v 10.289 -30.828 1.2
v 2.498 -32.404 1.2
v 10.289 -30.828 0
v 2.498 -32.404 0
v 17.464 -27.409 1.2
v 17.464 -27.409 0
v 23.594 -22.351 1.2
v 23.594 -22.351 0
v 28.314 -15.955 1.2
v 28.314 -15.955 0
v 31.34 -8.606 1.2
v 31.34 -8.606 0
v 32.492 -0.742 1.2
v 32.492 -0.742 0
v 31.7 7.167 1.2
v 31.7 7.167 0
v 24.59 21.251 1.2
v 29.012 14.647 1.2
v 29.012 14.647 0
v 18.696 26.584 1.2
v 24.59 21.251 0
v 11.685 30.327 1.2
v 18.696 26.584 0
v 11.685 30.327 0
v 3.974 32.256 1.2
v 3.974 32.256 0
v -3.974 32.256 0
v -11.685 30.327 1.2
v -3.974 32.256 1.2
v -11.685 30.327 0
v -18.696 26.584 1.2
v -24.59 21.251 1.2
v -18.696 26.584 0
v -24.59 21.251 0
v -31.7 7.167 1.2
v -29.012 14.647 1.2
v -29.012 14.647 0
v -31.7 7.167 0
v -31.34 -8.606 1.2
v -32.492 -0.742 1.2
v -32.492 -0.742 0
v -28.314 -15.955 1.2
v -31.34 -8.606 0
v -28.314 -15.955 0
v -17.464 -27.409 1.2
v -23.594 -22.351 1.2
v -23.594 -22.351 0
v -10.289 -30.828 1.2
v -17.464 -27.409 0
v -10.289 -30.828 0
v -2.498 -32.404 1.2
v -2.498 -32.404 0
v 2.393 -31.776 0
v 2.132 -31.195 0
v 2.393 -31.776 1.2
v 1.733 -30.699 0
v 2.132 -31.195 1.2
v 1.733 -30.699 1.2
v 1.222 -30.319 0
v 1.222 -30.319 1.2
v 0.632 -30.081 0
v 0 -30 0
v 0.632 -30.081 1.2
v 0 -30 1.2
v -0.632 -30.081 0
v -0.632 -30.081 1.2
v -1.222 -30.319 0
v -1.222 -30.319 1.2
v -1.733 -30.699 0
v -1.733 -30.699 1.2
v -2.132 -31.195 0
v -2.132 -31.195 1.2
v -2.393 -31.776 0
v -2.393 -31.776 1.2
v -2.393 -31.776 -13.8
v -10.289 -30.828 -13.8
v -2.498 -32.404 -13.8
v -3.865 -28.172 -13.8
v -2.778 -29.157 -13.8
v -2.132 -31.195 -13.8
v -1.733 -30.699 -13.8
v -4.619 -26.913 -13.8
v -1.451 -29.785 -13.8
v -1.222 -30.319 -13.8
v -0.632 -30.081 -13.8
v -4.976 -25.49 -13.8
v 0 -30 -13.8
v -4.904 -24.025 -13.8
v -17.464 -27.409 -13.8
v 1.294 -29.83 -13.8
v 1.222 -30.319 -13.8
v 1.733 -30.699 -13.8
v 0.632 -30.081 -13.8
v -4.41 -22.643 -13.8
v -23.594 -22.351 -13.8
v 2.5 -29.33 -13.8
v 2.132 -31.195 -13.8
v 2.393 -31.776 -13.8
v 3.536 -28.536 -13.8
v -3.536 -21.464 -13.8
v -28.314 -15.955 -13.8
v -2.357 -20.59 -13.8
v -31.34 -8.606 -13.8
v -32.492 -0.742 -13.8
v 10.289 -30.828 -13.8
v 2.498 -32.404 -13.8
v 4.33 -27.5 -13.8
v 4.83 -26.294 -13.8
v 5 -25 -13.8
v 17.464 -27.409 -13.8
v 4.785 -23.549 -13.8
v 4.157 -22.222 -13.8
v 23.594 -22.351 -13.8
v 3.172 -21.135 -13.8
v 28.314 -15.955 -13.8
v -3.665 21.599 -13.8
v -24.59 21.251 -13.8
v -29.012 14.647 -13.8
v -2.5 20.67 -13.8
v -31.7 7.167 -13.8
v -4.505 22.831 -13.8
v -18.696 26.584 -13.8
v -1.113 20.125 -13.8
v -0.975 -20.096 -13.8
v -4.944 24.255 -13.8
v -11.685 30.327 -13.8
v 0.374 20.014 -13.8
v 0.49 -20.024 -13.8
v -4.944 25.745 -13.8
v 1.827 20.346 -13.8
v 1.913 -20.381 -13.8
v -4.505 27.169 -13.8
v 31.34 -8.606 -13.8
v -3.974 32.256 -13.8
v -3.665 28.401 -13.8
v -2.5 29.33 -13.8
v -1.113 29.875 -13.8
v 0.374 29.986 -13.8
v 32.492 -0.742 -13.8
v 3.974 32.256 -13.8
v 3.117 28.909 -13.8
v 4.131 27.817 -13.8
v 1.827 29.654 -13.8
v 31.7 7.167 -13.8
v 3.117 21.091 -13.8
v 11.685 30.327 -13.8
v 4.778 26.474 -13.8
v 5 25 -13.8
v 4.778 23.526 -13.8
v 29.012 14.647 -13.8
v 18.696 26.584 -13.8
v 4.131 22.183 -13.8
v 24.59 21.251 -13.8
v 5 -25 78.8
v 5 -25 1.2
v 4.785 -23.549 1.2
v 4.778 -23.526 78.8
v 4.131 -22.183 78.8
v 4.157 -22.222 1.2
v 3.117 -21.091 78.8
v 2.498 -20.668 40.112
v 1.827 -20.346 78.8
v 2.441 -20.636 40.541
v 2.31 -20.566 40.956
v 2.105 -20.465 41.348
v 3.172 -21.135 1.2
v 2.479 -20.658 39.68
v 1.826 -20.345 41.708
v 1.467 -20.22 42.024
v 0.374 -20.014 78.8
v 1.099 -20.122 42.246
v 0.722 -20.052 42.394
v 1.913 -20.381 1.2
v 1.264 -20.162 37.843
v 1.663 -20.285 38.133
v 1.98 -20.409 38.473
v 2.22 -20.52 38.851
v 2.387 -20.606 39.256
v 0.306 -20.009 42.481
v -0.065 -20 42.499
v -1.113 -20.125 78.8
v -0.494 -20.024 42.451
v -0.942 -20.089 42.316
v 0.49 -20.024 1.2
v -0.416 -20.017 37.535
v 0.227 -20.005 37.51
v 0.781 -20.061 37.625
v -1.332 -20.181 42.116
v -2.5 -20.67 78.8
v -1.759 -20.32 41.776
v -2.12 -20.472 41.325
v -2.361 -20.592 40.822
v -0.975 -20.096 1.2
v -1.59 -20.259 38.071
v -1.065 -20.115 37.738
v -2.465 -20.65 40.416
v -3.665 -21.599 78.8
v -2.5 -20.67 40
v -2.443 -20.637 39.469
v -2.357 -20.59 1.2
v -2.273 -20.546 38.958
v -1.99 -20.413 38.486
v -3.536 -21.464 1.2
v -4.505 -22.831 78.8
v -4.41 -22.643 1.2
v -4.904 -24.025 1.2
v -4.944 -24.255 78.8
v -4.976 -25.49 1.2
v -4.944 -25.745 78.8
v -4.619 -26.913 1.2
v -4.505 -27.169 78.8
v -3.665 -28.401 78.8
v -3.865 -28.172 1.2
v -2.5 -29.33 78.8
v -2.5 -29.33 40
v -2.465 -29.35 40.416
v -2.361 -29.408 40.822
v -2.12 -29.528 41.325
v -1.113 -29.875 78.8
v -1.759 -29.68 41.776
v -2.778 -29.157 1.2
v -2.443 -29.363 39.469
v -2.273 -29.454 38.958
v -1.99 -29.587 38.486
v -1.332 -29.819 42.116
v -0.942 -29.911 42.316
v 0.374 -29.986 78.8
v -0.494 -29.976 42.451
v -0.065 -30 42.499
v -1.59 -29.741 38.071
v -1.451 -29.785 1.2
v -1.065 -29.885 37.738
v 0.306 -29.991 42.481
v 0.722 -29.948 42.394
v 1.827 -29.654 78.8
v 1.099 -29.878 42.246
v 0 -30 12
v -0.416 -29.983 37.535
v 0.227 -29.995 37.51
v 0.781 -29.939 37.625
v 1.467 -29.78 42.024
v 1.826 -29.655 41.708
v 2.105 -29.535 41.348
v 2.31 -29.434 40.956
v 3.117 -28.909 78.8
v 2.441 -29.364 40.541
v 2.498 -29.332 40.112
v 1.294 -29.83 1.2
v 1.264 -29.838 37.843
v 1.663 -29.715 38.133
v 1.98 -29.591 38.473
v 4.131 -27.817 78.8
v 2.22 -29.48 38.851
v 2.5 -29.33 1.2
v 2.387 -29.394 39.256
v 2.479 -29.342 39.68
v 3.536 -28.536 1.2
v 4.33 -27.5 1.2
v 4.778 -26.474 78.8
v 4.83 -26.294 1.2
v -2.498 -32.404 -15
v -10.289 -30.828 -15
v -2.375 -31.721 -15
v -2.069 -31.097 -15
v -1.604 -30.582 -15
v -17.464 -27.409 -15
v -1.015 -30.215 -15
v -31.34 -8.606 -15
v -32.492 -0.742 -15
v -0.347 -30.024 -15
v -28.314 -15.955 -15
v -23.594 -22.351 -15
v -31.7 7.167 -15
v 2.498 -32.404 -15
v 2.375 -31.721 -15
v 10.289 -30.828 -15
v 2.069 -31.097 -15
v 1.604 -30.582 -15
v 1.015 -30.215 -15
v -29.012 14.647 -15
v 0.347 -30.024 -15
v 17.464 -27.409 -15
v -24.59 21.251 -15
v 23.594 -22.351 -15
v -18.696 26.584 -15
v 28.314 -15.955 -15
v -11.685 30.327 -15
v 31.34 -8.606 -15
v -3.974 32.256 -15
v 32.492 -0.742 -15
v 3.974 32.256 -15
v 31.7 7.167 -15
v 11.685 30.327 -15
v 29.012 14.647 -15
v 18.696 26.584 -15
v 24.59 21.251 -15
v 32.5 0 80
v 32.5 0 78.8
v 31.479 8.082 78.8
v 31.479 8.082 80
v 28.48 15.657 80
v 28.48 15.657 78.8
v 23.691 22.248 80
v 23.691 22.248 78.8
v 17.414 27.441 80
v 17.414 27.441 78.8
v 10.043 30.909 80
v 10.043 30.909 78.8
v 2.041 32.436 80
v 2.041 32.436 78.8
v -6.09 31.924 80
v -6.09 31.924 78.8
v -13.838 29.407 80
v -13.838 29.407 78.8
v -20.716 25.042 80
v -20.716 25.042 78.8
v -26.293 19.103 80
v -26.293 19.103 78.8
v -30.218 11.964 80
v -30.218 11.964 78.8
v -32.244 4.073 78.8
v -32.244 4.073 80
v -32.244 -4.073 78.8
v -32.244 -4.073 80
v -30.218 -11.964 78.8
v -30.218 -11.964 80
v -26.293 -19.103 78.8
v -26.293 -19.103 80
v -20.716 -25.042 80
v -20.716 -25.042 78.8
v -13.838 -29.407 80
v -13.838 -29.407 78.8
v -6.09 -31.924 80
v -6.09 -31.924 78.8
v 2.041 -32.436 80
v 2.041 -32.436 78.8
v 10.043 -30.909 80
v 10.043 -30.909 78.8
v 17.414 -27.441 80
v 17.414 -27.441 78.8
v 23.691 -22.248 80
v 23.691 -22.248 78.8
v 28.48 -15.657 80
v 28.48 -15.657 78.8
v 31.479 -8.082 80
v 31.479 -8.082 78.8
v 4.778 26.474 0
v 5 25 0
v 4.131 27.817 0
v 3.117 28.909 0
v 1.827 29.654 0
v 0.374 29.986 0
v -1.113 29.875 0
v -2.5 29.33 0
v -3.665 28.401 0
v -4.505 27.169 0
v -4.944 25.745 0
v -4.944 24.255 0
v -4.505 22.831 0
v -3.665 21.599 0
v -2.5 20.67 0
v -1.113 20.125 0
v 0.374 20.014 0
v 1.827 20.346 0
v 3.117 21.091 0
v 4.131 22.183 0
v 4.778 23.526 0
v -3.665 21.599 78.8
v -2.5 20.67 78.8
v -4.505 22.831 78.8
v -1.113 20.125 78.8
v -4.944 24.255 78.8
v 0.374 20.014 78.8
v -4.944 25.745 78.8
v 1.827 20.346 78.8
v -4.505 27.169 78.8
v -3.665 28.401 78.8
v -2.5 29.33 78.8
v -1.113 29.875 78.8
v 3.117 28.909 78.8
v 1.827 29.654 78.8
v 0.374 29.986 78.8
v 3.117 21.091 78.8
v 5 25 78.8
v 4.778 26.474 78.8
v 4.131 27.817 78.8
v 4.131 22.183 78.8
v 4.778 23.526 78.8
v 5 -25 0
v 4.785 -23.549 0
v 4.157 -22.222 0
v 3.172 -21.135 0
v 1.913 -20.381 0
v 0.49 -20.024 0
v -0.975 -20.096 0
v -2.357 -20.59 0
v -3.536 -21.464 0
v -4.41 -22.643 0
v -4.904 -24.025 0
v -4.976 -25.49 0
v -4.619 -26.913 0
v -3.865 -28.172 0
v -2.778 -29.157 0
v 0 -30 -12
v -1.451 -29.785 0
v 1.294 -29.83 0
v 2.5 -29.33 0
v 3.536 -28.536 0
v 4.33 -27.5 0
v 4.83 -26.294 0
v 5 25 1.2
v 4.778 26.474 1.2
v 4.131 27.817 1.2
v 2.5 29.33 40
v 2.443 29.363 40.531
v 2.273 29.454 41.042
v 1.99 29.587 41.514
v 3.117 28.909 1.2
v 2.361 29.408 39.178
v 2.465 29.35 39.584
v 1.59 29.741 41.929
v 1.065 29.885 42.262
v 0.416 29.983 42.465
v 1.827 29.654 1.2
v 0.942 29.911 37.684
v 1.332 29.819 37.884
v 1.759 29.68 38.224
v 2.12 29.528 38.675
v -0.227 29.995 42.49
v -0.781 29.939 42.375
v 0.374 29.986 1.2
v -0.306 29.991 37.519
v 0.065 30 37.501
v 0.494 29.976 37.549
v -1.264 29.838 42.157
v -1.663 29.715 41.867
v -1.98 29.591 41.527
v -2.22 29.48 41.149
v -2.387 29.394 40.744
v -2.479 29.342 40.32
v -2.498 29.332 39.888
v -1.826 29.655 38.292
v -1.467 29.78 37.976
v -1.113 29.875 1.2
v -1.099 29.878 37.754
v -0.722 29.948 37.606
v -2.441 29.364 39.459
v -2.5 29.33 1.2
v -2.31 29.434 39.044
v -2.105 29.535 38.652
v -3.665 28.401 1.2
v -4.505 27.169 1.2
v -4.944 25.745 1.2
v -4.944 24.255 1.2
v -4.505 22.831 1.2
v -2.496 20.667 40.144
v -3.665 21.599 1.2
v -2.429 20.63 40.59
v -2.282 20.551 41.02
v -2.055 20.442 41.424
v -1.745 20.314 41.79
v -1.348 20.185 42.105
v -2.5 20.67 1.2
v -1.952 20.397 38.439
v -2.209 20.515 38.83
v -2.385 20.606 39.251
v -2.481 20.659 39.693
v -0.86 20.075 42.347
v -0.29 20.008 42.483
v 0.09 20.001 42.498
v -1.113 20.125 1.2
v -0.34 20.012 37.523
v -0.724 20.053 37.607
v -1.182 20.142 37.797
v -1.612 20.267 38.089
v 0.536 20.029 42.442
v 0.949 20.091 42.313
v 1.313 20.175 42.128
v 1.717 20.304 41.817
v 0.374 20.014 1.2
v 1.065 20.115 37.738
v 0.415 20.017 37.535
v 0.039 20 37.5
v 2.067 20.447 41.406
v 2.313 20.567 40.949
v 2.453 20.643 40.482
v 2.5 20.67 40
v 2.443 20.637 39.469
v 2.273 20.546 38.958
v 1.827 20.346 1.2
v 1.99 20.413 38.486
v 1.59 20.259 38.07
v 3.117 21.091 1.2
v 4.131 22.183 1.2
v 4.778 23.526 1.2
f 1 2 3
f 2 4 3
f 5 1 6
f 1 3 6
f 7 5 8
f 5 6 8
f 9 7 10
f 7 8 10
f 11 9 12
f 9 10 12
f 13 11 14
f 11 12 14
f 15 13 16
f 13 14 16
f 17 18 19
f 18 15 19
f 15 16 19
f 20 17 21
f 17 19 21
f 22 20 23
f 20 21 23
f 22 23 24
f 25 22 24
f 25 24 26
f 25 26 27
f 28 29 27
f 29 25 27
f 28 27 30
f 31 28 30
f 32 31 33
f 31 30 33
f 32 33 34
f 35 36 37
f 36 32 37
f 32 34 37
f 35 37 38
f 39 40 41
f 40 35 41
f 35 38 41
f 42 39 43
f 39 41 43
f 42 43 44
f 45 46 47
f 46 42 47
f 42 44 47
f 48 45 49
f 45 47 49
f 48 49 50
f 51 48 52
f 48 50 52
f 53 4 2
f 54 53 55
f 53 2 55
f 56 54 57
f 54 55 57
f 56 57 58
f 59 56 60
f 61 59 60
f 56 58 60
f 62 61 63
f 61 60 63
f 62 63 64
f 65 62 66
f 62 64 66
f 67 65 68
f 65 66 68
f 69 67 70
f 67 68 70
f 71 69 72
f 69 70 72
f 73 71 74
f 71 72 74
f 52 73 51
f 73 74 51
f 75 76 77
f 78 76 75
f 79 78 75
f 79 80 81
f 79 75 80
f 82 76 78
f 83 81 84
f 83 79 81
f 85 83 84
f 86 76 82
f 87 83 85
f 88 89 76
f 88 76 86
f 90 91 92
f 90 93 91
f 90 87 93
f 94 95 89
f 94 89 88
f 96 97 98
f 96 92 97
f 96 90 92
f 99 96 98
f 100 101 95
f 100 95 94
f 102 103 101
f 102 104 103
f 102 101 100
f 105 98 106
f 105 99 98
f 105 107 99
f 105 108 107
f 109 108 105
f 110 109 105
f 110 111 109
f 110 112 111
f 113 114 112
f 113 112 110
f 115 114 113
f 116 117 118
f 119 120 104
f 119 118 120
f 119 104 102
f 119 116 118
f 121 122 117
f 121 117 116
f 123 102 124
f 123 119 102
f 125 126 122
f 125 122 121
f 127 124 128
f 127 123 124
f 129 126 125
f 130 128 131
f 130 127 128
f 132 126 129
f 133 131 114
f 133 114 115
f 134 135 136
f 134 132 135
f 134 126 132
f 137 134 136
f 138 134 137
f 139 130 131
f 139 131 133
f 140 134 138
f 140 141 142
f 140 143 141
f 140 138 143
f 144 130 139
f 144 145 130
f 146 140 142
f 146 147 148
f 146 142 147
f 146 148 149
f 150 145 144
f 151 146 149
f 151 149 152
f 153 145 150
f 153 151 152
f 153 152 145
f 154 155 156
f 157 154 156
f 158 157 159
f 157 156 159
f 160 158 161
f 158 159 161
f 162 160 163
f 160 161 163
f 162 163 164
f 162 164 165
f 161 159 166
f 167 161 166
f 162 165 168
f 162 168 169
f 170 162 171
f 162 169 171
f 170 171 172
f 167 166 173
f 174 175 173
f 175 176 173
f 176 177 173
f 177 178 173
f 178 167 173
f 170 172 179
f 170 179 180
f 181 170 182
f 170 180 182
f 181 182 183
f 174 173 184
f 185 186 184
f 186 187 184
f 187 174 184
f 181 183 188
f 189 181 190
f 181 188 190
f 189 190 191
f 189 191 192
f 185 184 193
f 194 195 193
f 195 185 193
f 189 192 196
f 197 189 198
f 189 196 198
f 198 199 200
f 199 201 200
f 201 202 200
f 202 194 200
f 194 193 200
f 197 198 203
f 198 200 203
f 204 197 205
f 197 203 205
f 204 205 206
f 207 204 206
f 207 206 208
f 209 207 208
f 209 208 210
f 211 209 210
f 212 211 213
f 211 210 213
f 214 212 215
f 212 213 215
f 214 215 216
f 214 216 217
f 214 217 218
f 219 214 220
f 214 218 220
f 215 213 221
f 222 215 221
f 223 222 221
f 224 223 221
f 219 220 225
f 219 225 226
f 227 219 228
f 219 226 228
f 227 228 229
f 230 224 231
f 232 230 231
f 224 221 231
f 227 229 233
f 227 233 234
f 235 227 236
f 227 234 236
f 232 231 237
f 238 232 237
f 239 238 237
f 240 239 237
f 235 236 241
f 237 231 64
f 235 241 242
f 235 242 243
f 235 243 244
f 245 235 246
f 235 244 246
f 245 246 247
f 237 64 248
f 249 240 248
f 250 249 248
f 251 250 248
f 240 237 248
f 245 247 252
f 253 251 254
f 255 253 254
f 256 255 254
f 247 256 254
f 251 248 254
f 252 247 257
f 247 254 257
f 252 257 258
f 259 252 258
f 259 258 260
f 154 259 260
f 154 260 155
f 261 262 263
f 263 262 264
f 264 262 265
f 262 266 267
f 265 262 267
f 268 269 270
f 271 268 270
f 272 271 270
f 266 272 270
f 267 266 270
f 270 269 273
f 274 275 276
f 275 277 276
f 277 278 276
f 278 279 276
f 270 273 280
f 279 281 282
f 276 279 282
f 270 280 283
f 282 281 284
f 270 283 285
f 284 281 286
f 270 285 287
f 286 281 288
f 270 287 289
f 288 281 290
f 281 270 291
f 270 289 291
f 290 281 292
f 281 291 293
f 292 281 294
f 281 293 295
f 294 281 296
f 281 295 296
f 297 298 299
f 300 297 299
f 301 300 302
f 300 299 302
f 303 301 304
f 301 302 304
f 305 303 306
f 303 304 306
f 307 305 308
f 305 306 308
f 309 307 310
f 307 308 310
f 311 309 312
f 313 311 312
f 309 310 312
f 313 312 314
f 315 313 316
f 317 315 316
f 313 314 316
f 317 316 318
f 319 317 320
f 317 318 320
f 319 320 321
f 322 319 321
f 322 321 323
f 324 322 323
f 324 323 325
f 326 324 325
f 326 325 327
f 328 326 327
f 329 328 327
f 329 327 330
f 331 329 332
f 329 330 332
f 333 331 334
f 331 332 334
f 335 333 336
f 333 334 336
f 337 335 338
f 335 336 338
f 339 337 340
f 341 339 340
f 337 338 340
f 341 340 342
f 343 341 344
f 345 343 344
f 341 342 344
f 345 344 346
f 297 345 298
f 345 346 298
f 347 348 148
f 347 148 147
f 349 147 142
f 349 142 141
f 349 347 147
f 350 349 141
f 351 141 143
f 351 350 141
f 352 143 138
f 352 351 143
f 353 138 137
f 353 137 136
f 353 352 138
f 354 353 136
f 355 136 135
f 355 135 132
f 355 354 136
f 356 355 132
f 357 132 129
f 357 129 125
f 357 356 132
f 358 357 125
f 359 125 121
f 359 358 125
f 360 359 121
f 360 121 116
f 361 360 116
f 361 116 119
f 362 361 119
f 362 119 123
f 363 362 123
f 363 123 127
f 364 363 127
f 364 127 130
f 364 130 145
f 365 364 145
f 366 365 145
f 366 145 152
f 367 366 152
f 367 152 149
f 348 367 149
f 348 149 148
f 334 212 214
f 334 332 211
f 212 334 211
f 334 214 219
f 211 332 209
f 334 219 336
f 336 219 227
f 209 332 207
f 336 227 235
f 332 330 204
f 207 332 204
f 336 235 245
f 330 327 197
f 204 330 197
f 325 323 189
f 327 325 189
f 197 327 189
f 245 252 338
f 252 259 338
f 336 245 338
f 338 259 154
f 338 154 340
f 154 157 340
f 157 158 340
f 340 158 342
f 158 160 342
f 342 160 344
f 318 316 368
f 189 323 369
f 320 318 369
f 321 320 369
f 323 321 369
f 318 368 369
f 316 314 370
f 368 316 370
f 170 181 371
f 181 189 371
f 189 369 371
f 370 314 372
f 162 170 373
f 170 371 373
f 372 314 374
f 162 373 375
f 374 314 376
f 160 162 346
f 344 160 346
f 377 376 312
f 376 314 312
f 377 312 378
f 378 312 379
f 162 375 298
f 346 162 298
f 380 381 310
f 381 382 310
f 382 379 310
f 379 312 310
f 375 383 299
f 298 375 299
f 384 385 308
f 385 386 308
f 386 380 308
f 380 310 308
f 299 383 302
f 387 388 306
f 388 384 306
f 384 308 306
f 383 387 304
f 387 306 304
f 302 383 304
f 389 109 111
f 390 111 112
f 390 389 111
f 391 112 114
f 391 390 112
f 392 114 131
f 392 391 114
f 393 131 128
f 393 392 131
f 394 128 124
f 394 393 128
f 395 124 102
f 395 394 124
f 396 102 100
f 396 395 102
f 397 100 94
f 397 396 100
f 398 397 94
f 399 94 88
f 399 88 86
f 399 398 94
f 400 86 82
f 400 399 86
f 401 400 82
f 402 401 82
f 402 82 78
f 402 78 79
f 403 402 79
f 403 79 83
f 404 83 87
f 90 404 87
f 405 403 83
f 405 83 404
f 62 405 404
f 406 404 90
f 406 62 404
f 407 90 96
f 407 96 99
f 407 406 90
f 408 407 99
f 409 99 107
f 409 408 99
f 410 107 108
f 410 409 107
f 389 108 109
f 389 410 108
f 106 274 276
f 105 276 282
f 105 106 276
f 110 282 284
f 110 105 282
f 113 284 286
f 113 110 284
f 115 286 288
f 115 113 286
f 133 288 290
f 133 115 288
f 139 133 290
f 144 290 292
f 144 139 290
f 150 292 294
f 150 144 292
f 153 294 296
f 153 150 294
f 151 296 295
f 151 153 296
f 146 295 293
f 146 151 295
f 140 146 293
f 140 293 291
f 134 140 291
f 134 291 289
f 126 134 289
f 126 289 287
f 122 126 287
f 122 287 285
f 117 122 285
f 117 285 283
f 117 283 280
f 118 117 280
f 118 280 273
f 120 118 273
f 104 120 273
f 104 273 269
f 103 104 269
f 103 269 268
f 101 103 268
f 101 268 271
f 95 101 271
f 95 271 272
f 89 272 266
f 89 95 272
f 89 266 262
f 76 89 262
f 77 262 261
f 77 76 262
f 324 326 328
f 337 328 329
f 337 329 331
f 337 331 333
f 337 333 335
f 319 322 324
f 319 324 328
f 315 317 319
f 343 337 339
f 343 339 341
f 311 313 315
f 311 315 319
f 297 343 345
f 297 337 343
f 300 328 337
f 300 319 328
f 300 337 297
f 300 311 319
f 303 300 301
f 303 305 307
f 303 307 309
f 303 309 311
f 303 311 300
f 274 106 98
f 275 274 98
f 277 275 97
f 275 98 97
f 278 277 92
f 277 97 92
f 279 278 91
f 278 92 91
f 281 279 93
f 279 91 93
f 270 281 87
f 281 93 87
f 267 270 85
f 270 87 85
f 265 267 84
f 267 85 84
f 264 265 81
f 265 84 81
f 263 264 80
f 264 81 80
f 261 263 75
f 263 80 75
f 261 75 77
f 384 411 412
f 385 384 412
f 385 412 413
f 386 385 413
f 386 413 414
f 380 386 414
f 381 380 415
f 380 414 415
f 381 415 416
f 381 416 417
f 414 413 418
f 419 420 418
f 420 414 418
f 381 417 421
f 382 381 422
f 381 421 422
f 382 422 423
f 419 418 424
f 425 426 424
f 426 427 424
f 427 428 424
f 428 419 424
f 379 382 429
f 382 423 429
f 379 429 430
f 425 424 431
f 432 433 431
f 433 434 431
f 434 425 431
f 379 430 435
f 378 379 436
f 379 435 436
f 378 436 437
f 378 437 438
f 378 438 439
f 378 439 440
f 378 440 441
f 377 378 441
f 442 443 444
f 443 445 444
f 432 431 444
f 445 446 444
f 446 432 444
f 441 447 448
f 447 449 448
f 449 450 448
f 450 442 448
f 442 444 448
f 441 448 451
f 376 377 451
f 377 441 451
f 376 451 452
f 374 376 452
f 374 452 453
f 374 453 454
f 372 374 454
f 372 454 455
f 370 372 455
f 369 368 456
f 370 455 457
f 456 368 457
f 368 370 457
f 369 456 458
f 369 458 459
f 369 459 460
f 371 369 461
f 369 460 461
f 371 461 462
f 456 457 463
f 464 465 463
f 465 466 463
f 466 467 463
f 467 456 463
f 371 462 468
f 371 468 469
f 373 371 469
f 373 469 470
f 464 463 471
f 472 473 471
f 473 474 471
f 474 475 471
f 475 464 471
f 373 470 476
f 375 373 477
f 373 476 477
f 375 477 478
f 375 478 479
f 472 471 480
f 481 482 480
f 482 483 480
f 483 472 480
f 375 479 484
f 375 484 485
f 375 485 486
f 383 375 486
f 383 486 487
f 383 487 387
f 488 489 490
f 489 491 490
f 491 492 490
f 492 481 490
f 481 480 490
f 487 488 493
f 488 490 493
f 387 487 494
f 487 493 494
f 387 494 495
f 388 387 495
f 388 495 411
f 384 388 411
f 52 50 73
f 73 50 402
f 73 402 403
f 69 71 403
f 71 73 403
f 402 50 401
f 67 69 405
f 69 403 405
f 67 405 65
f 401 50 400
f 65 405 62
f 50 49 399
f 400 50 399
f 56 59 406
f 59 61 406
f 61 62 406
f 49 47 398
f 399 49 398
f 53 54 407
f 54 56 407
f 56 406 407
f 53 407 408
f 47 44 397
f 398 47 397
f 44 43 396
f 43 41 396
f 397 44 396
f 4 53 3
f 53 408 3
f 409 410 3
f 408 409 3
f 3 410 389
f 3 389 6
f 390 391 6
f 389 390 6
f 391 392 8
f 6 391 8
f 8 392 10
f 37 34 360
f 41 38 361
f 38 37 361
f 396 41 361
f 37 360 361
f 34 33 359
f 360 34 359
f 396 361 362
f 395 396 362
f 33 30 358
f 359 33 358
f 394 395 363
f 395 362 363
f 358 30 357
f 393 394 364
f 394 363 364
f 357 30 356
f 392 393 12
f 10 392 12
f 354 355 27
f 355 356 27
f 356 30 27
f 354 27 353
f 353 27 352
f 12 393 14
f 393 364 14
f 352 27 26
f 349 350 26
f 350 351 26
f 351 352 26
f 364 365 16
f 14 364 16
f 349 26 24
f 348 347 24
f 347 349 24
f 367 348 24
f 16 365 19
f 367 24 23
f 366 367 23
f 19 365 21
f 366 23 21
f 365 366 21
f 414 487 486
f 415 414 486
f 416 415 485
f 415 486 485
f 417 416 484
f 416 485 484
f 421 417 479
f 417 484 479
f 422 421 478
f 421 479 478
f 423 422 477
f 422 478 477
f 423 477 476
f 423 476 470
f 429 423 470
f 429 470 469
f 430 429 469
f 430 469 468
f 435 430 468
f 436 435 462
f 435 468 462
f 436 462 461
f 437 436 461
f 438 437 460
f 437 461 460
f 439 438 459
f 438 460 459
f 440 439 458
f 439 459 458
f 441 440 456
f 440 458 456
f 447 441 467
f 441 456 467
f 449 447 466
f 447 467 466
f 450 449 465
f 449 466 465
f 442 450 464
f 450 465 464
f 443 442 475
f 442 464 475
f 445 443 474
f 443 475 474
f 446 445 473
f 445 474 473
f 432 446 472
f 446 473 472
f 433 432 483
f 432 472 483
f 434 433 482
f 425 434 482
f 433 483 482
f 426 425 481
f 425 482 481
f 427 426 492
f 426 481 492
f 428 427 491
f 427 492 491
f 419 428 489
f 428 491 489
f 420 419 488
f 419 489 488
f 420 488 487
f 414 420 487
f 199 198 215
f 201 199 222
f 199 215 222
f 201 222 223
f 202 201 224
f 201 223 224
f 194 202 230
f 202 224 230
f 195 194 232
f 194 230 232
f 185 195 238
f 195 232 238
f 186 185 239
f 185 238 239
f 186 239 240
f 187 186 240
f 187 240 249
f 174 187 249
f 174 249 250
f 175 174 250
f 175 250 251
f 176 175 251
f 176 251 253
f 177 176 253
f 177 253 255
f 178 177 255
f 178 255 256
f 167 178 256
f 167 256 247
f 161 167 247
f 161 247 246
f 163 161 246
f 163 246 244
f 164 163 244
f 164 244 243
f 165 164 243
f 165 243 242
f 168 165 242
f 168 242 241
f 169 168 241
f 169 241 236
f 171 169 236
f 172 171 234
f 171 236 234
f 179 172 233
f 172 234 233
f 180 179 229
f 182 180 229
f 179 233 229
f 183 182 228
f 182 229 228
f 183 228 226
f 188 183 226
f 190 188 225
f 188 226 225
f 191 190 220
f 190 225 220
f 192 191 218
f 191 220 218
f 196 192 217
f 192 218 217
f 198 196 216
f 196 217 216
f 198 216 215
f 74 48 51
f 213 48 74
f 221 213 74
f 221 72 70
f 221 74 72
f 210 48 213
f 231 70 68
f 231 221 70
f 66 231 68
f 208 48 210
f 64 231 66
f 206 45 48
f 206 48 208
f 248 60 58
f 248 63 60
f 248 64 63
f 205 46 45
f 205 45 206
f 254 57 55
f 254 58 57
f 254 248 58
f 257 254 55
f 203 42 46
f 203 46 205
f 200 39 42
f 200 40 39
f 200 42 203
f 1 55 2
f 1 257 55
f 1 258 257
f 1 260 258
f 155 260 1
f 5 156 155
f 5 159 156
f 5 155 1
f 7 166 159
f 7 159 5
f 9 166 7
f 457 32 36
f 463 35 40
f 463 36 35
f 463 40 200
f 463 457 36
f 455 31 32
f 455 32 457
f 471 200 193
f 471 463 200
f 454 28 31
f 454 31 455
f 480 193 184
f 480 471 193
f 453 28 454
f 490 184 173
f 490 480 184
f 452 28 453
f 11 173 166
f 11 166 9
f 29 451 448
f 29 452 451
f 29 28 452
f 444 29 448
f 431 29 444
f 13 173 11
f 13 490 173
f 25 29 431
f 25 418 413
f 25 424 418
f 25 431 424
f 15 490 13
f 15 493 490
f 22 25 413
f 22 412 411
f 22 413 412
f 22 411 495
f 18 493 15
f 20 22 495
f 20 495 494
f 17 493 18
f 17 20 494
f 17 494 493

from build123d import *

# Parameters (mm, degrees)
F1_START      = 78.8
F0_R          = 32.5
F0_R_2        = 5
F1_DEPTH      = 1.2
F2_DEPTH      = 80
F2_DEPTH_BACK = 15
F3_DEPTH      = 1.2
F4_START      = -13.8
F4_DEPTH      = 1.2
F5_D          = 5
F5_DEPTH      = 15.001
F6_D          = 5
F6_DEPTH      = 12
F6_TIP        = 1.5021515476
F8_D          = 5
F8_DEPTH      = 32.501
F9_D          = 5


with BuildPart() as f1:
    # F0 (on Top) → F1 (new body)
    with BuildSketch(Plane.XY.offset(F1_START)):
        Circle(F0_R)
        with Locations((0, -25)):
            Circle(F0_R_2, mode=Mode.SUBTRACT)
        with Locations((0, 25)):
            Circle(F0_R_2, mode=Mode.SUBTRACT)
    extrude(amount=F1_DEPTH)

    # F0 (on Top) → F2 (join, two sides)
    with BuildSketch(Plane.XY) as f2_sk:
        with Locations((0, 25)):
            Circle(F0_R_2)
        with Locations((0, -25)):
            Circle(F0_R_2)
    extrude(amount=F2_DEPTH)
    extrude(f2_sk.sketch, amount=-F2_DEPTH_BACK)

    # F0 (on Top) → F3 (join)
    with BuildSketch(Plane.XY):
        Circle(F0_R)
        with Locations((0, -25)):
            Circle(F0_R_2, mode=Mode.SUBTRACT)
        with Locations((0, 25)):
            Circle(F0_R_2, mode=Mode.SUBTRACT)
    extrude(amount=F3_DEPTH)

    # F0 (on Top) → F4 (join)
    with BuildSketch(Plane.XY.offset(F4_START)):
        Circle(F0_R)
        with Locations((0, -25)):
            Circle(F0_R_2, mode=Mode.SUBTRACT)
        with Locations((0, 25)):
            Circle(F0_R_2, mode=Mode.SUBTRACT)
    extrude(amount=-F4_DEPTH)

    # F5 (through all, one way)
    with BuildSketch(Plane.XY):
        with Locations((0, -32.5)):
            Circle(F5_D / 2)
    extrude(amount=-F5_DEPTH, mode=Mode.SUBTRACT)

    # F6
    with Locations(Plane(origin=(0, 0, 0), x_dir=(1, 0, 0), z_dir=(0, 0, -1))):
        with Locations((0, 32.5)):
            Hole(F6_D / 2, depth=F6_DEPTH)
            with Locations((0, 0, -(F6_DEPTH + F6_TIP / 2))):  # 118° drill point
                Cone(0, F6_D / 2, F6_TIP, mode=Mode.SUBTRACT)

    # F8 (through all, one way)
    with BuildSketch(Plane.XZ):
        with Locations((0, 40)):
            Circle(F8_D / 2)
    extrude(amount=-F8_DEPTH, mode=Mode.SUBTRACT)

    # F9 (through all)
    with Locations(Plane(origin=(0, 0, 0), x_dir=(1, 0, 0), z_dir=(0, 1, 0))):
        with Locations((0, -40)):
            Hole(F9_D / 2)


solid = f1.part
